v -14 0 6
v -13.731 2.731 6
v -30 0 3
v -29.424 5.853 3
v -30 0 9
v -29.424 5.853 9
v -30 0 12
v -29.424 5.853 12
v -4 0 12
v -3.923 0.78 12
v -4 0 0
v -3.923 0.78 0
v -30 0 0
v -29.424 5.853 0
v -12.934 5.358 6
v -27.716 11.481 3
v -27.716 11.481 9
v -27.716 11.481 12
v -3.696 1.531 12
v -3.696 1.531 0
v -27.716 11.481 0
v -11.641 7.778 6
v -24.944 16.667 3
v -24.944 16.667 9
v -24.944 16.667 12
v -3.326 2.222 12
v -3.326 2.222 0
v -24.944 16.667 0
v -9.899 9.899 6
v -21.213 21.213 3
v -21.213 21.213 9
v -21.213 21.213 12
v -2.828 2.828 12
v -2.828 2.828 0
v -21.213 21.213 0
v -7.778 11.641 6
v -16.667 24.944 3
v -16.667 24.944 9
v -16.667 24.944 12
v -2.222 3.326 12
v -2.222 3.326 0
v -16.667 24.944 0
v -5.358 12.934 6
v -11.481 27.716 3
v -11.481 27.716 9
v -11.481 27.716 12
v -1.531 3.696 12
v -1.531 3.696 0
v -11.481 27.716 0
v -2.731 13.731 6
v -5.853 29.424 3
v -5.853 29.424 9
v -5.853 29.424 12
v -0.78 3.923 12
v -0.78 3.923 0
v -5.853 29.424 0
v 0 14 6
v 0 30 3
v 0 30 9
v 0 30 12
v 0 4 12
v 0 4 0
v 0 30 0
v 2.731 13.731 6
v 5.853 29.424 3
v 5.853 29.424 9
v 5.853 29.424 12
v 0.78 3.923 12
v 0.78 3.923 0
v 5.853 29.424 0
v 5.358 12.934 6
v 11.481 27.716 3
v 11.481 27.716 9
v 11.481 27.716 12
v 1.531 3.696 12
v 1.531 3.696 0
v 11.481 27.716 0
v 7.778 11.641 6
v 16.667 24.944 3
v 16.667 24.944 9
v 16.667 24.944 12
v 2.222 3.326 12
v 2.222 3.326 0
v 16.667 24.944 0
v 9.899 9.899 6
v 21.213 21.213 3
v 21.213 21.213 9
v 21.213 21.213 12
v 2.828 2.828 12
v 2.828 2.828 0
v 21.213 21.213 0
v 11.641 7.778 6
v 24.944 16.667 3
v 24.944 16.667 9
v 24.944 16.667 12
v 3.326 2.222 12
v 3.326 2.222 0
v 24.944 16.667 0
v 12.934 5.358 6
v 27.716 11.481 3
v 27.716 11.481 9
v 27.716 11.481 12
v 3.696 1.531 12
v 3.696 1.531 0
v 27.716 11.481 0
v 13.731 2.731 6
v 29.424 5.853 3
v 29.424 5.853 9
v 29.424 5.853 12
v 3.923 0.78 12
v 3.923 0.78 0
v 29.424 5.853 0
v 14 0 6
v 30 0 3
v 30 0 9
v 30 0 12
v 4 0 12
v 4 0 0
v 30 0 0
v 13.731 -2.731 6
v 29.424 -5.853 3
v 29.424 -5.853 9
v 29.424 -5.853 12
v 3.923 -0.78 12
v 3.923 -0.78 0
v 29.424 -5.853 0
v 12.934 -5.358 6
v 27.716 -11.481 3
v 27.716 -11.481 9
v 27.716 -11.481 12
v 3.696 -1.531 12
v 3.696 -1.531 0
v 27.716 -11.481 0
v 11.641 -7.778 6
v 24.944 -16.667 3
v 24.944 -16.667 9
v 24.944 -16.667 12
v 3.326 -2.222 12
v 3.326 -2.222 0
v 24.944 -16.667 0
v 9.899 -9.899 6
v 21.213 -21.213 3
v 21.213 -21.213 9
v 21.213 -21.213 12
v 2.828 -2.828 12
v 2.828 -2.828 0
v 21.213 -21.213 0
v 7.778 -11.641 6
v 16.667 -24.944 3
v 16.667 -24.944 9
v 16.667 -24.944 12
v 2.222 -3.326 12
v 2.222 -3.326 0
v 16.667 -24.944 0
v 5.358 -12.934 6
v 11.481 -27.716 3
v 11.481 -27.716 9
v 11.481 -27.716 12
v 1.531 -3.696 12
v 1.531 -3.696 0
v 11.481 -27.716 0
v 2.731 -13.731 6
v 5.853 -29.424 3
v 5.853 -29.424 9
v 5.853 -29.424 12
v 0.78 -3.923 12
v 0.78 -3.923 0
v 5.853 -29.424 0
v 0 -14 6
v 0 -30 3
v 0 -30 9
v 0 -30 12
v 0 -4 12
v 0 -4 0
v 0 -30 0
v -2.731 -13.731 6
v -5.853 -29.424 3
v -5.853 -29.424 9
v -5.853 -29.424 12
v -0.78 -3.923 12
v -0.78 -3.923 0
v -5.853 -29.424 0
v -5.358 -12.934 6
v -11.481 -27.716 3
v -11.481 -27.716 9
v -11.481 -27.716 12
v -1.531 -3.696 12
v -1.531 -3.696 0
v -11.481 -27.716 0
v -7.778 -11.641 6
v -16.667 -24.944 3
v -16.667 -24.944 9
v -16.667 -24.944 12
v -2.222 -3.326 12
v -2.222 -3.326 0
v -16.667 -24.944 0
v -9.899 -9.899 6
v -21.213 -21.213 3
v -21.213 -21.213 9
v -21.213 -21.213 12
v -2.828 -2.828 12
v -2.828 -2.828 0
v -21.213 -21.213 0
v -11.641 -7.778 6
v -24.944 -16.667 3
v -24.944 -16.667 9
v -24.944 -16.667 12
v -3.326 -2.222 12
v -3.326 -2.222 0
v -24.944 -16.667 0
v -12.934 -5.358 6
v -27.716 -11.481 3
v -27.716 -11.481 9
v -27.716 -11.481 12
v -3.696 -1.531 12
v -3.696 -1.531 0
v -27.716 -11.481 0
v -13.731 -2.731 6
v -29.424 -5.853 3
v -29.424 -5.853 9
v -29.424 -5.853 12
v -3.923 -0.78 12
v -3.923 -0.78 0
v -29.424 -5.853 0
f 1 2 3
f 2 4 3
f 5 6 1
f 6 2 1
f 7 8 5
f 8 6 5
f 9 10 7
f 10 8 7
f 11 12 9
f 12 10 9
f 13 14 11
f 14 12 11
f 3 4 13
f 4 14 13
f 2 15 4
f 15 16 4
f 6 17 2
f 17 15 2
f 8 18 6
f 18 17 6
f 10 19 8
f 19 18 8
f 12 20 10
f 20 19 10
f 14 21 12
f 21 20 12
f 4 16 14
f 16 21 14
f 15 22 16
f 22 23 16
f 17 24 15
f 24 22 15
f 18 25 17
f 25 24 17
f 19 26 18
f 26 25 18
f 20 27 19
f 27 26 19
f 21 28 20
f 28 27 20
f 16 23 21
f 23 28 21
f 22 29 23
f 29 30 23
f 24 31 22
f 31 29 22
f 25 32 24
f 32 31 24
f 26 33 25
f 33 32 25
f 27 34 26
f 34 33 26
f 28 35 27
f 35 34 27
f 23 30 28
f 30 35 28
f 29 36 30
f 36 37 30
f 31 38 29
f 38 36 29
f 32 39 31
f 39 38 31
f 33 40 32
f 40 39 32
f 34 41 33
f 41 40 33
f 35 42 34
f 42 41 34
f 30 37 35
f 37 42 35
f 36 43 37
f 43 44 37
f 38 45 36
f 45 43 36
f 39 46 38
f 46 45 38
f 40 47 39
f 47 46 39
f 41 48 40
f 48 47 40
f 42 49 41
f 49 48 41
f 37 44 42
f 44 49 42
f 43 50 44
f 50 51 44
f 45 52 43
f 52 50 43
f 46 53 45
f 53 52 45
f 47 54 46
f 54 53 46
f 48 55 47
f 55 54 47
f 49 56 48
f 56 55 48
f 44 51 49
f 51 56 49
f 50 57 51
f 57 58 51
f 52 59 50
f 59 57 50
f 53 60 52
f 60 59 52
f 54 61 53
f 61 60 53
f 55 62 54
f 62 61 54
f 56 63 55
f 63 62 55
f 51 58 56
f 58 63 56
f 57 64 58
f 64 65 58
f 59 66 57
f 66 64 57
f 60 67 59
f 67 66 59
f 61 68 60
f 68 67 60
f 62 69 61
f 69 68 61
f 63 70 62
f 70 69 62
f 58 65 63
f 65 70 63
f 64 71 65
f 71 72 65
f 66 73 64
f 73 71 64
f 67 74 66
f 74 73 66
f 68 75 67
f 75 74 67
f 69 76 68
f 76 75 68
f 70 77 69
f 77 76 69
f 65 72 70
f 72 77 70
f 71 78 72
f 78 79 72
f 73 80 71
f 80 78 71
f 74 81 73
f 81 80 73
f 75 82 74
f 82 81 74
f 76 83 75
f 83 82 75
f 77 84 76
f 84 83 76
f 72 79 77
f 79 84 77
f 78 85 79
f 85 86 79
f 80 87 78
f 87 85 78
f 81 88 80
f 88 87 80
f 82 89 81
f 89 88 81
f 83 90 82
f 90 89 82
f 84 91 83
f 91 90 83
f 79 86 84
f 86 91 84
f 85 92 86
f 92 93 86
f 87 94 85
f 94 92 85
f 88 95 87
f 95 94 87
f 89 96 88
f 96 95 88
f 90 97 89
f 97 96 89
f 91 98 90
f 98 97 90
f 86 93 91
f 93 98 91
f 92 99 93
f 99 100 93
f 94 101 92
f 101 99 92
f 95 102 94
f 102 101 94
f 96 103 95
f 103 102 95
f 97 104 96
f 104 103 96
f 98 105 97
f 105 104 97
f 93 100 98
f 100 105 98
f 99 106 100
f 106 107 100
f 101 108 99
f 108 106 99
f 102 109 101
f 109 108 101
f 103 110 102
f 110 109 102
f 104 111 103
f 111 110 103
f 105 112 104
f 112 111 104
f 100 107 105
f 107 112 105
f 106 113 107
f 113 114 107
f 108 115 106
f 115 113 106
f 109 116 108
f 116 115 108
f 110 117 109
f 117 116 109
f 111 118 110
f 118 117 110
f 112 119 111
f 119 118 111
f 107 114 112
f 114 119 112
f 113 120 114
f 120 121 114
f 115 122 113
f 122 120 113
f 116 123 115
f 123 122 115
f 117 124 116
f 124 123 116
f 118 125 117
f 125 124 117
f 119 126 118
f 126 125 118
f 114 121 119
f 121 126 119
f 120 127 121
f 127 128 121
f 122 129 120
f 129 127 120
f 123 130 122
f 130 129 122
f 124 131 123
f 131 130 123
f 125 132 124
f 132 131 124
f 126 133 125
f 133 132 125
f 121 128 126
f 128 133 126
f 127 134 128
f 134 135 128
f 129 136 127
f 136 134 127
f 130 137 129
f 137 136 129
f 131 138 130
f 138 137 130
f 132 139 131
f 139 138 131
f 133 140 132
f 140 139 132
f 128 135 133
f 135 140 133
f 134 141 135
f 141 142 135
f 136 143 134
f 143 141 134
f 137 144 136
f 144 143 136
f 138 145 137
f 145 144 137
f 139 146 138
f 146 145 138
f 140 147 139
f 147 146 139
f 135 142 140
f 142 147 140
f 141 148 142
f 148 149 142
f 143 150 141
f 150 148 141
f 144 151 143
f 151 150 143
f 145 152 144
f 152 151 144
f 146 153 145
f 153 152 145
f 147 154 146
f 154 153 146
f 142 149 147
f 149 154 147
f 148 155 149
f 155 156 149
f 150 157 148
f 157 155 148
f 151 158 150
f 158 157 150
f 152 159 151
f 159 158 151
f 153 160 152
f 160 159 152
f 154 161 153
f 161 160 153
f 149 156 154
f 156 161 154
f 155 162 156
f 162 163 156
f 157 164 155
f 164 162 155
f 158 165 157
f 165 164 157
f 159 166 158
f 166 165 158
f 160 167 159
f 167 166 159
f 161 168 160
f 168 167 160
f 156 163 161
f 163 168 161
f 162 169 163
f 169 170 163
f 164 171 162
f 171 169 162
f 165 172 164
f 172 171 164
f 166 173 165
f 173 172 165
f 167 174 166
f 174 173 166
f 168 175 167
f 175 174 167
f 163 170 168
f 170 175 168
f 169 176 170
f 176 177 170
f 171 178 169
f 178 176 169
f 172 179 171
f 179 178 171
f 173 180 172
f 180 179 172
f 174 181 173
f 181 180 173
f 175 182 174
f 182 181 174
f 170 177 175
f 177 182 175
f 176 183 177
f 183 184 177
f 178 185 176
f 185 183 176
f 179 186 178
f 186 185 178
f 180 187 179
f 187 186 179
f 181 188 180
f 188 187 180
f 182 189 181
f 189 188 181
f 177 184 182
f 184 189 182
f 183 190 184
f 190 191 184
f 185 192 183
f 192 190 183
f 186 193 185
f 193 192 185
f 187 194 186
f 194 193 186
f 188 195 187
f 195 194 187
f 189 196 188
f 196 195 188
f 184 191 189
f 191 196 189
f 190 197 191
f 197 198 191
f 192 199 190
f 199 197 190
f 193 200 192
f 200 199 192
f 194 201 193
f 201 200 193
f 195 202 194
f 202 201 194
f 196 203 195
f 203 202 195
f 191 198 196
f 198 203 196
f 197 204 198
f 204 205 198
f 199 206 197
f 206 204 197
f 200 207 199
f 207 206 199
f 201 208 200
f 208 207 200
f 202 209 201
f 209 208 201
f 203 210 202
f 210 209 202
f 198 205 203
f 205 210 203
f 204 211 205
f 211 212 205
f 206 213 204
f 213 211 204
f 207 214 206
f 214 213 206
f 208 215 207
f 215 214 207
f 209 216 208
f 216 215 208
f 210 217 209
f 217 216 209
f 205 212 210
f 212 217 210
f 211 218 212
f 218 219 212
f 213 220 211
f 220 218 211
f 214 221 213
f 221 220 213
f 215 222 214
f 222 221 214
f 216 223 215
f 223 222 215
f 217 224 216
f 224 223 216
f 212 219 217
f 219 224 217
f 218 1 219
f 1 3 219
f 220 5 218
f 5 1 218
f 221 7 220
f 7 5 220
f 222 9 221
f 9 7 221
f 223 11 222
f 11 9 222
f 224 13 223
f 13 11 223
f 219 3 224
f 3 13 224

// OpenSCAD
$fn = 32;

// ----------------------------------------------------------------------
// Revolved part: V-groove pulley R30
// ----------------------------------------------------------------------

// --- parameters (mm) ---
bore_r = 4;               // bore radius
rim_r = 30;               // rim radius
rim_t = 12;               // rim width
groove_r = 14;            // groove root radius
groove_w = 3;             // groove half width
revolve_angle = 360;      // revolve sweep, degrees

bore_d = 2 * bore_r;
rim_d = 2 * rim_r;
groove_d = 2 * groove_r;

profile = [[4, 0], [30, 0], [30, 3], [14, 6], [30, 9], [30, 12], [4, 12]];  // primary outline, 7 points, counter clockwise

// --- the one profile operation ---
rotate_extrude(angle = revolve_angle) polygon(points = profile);
